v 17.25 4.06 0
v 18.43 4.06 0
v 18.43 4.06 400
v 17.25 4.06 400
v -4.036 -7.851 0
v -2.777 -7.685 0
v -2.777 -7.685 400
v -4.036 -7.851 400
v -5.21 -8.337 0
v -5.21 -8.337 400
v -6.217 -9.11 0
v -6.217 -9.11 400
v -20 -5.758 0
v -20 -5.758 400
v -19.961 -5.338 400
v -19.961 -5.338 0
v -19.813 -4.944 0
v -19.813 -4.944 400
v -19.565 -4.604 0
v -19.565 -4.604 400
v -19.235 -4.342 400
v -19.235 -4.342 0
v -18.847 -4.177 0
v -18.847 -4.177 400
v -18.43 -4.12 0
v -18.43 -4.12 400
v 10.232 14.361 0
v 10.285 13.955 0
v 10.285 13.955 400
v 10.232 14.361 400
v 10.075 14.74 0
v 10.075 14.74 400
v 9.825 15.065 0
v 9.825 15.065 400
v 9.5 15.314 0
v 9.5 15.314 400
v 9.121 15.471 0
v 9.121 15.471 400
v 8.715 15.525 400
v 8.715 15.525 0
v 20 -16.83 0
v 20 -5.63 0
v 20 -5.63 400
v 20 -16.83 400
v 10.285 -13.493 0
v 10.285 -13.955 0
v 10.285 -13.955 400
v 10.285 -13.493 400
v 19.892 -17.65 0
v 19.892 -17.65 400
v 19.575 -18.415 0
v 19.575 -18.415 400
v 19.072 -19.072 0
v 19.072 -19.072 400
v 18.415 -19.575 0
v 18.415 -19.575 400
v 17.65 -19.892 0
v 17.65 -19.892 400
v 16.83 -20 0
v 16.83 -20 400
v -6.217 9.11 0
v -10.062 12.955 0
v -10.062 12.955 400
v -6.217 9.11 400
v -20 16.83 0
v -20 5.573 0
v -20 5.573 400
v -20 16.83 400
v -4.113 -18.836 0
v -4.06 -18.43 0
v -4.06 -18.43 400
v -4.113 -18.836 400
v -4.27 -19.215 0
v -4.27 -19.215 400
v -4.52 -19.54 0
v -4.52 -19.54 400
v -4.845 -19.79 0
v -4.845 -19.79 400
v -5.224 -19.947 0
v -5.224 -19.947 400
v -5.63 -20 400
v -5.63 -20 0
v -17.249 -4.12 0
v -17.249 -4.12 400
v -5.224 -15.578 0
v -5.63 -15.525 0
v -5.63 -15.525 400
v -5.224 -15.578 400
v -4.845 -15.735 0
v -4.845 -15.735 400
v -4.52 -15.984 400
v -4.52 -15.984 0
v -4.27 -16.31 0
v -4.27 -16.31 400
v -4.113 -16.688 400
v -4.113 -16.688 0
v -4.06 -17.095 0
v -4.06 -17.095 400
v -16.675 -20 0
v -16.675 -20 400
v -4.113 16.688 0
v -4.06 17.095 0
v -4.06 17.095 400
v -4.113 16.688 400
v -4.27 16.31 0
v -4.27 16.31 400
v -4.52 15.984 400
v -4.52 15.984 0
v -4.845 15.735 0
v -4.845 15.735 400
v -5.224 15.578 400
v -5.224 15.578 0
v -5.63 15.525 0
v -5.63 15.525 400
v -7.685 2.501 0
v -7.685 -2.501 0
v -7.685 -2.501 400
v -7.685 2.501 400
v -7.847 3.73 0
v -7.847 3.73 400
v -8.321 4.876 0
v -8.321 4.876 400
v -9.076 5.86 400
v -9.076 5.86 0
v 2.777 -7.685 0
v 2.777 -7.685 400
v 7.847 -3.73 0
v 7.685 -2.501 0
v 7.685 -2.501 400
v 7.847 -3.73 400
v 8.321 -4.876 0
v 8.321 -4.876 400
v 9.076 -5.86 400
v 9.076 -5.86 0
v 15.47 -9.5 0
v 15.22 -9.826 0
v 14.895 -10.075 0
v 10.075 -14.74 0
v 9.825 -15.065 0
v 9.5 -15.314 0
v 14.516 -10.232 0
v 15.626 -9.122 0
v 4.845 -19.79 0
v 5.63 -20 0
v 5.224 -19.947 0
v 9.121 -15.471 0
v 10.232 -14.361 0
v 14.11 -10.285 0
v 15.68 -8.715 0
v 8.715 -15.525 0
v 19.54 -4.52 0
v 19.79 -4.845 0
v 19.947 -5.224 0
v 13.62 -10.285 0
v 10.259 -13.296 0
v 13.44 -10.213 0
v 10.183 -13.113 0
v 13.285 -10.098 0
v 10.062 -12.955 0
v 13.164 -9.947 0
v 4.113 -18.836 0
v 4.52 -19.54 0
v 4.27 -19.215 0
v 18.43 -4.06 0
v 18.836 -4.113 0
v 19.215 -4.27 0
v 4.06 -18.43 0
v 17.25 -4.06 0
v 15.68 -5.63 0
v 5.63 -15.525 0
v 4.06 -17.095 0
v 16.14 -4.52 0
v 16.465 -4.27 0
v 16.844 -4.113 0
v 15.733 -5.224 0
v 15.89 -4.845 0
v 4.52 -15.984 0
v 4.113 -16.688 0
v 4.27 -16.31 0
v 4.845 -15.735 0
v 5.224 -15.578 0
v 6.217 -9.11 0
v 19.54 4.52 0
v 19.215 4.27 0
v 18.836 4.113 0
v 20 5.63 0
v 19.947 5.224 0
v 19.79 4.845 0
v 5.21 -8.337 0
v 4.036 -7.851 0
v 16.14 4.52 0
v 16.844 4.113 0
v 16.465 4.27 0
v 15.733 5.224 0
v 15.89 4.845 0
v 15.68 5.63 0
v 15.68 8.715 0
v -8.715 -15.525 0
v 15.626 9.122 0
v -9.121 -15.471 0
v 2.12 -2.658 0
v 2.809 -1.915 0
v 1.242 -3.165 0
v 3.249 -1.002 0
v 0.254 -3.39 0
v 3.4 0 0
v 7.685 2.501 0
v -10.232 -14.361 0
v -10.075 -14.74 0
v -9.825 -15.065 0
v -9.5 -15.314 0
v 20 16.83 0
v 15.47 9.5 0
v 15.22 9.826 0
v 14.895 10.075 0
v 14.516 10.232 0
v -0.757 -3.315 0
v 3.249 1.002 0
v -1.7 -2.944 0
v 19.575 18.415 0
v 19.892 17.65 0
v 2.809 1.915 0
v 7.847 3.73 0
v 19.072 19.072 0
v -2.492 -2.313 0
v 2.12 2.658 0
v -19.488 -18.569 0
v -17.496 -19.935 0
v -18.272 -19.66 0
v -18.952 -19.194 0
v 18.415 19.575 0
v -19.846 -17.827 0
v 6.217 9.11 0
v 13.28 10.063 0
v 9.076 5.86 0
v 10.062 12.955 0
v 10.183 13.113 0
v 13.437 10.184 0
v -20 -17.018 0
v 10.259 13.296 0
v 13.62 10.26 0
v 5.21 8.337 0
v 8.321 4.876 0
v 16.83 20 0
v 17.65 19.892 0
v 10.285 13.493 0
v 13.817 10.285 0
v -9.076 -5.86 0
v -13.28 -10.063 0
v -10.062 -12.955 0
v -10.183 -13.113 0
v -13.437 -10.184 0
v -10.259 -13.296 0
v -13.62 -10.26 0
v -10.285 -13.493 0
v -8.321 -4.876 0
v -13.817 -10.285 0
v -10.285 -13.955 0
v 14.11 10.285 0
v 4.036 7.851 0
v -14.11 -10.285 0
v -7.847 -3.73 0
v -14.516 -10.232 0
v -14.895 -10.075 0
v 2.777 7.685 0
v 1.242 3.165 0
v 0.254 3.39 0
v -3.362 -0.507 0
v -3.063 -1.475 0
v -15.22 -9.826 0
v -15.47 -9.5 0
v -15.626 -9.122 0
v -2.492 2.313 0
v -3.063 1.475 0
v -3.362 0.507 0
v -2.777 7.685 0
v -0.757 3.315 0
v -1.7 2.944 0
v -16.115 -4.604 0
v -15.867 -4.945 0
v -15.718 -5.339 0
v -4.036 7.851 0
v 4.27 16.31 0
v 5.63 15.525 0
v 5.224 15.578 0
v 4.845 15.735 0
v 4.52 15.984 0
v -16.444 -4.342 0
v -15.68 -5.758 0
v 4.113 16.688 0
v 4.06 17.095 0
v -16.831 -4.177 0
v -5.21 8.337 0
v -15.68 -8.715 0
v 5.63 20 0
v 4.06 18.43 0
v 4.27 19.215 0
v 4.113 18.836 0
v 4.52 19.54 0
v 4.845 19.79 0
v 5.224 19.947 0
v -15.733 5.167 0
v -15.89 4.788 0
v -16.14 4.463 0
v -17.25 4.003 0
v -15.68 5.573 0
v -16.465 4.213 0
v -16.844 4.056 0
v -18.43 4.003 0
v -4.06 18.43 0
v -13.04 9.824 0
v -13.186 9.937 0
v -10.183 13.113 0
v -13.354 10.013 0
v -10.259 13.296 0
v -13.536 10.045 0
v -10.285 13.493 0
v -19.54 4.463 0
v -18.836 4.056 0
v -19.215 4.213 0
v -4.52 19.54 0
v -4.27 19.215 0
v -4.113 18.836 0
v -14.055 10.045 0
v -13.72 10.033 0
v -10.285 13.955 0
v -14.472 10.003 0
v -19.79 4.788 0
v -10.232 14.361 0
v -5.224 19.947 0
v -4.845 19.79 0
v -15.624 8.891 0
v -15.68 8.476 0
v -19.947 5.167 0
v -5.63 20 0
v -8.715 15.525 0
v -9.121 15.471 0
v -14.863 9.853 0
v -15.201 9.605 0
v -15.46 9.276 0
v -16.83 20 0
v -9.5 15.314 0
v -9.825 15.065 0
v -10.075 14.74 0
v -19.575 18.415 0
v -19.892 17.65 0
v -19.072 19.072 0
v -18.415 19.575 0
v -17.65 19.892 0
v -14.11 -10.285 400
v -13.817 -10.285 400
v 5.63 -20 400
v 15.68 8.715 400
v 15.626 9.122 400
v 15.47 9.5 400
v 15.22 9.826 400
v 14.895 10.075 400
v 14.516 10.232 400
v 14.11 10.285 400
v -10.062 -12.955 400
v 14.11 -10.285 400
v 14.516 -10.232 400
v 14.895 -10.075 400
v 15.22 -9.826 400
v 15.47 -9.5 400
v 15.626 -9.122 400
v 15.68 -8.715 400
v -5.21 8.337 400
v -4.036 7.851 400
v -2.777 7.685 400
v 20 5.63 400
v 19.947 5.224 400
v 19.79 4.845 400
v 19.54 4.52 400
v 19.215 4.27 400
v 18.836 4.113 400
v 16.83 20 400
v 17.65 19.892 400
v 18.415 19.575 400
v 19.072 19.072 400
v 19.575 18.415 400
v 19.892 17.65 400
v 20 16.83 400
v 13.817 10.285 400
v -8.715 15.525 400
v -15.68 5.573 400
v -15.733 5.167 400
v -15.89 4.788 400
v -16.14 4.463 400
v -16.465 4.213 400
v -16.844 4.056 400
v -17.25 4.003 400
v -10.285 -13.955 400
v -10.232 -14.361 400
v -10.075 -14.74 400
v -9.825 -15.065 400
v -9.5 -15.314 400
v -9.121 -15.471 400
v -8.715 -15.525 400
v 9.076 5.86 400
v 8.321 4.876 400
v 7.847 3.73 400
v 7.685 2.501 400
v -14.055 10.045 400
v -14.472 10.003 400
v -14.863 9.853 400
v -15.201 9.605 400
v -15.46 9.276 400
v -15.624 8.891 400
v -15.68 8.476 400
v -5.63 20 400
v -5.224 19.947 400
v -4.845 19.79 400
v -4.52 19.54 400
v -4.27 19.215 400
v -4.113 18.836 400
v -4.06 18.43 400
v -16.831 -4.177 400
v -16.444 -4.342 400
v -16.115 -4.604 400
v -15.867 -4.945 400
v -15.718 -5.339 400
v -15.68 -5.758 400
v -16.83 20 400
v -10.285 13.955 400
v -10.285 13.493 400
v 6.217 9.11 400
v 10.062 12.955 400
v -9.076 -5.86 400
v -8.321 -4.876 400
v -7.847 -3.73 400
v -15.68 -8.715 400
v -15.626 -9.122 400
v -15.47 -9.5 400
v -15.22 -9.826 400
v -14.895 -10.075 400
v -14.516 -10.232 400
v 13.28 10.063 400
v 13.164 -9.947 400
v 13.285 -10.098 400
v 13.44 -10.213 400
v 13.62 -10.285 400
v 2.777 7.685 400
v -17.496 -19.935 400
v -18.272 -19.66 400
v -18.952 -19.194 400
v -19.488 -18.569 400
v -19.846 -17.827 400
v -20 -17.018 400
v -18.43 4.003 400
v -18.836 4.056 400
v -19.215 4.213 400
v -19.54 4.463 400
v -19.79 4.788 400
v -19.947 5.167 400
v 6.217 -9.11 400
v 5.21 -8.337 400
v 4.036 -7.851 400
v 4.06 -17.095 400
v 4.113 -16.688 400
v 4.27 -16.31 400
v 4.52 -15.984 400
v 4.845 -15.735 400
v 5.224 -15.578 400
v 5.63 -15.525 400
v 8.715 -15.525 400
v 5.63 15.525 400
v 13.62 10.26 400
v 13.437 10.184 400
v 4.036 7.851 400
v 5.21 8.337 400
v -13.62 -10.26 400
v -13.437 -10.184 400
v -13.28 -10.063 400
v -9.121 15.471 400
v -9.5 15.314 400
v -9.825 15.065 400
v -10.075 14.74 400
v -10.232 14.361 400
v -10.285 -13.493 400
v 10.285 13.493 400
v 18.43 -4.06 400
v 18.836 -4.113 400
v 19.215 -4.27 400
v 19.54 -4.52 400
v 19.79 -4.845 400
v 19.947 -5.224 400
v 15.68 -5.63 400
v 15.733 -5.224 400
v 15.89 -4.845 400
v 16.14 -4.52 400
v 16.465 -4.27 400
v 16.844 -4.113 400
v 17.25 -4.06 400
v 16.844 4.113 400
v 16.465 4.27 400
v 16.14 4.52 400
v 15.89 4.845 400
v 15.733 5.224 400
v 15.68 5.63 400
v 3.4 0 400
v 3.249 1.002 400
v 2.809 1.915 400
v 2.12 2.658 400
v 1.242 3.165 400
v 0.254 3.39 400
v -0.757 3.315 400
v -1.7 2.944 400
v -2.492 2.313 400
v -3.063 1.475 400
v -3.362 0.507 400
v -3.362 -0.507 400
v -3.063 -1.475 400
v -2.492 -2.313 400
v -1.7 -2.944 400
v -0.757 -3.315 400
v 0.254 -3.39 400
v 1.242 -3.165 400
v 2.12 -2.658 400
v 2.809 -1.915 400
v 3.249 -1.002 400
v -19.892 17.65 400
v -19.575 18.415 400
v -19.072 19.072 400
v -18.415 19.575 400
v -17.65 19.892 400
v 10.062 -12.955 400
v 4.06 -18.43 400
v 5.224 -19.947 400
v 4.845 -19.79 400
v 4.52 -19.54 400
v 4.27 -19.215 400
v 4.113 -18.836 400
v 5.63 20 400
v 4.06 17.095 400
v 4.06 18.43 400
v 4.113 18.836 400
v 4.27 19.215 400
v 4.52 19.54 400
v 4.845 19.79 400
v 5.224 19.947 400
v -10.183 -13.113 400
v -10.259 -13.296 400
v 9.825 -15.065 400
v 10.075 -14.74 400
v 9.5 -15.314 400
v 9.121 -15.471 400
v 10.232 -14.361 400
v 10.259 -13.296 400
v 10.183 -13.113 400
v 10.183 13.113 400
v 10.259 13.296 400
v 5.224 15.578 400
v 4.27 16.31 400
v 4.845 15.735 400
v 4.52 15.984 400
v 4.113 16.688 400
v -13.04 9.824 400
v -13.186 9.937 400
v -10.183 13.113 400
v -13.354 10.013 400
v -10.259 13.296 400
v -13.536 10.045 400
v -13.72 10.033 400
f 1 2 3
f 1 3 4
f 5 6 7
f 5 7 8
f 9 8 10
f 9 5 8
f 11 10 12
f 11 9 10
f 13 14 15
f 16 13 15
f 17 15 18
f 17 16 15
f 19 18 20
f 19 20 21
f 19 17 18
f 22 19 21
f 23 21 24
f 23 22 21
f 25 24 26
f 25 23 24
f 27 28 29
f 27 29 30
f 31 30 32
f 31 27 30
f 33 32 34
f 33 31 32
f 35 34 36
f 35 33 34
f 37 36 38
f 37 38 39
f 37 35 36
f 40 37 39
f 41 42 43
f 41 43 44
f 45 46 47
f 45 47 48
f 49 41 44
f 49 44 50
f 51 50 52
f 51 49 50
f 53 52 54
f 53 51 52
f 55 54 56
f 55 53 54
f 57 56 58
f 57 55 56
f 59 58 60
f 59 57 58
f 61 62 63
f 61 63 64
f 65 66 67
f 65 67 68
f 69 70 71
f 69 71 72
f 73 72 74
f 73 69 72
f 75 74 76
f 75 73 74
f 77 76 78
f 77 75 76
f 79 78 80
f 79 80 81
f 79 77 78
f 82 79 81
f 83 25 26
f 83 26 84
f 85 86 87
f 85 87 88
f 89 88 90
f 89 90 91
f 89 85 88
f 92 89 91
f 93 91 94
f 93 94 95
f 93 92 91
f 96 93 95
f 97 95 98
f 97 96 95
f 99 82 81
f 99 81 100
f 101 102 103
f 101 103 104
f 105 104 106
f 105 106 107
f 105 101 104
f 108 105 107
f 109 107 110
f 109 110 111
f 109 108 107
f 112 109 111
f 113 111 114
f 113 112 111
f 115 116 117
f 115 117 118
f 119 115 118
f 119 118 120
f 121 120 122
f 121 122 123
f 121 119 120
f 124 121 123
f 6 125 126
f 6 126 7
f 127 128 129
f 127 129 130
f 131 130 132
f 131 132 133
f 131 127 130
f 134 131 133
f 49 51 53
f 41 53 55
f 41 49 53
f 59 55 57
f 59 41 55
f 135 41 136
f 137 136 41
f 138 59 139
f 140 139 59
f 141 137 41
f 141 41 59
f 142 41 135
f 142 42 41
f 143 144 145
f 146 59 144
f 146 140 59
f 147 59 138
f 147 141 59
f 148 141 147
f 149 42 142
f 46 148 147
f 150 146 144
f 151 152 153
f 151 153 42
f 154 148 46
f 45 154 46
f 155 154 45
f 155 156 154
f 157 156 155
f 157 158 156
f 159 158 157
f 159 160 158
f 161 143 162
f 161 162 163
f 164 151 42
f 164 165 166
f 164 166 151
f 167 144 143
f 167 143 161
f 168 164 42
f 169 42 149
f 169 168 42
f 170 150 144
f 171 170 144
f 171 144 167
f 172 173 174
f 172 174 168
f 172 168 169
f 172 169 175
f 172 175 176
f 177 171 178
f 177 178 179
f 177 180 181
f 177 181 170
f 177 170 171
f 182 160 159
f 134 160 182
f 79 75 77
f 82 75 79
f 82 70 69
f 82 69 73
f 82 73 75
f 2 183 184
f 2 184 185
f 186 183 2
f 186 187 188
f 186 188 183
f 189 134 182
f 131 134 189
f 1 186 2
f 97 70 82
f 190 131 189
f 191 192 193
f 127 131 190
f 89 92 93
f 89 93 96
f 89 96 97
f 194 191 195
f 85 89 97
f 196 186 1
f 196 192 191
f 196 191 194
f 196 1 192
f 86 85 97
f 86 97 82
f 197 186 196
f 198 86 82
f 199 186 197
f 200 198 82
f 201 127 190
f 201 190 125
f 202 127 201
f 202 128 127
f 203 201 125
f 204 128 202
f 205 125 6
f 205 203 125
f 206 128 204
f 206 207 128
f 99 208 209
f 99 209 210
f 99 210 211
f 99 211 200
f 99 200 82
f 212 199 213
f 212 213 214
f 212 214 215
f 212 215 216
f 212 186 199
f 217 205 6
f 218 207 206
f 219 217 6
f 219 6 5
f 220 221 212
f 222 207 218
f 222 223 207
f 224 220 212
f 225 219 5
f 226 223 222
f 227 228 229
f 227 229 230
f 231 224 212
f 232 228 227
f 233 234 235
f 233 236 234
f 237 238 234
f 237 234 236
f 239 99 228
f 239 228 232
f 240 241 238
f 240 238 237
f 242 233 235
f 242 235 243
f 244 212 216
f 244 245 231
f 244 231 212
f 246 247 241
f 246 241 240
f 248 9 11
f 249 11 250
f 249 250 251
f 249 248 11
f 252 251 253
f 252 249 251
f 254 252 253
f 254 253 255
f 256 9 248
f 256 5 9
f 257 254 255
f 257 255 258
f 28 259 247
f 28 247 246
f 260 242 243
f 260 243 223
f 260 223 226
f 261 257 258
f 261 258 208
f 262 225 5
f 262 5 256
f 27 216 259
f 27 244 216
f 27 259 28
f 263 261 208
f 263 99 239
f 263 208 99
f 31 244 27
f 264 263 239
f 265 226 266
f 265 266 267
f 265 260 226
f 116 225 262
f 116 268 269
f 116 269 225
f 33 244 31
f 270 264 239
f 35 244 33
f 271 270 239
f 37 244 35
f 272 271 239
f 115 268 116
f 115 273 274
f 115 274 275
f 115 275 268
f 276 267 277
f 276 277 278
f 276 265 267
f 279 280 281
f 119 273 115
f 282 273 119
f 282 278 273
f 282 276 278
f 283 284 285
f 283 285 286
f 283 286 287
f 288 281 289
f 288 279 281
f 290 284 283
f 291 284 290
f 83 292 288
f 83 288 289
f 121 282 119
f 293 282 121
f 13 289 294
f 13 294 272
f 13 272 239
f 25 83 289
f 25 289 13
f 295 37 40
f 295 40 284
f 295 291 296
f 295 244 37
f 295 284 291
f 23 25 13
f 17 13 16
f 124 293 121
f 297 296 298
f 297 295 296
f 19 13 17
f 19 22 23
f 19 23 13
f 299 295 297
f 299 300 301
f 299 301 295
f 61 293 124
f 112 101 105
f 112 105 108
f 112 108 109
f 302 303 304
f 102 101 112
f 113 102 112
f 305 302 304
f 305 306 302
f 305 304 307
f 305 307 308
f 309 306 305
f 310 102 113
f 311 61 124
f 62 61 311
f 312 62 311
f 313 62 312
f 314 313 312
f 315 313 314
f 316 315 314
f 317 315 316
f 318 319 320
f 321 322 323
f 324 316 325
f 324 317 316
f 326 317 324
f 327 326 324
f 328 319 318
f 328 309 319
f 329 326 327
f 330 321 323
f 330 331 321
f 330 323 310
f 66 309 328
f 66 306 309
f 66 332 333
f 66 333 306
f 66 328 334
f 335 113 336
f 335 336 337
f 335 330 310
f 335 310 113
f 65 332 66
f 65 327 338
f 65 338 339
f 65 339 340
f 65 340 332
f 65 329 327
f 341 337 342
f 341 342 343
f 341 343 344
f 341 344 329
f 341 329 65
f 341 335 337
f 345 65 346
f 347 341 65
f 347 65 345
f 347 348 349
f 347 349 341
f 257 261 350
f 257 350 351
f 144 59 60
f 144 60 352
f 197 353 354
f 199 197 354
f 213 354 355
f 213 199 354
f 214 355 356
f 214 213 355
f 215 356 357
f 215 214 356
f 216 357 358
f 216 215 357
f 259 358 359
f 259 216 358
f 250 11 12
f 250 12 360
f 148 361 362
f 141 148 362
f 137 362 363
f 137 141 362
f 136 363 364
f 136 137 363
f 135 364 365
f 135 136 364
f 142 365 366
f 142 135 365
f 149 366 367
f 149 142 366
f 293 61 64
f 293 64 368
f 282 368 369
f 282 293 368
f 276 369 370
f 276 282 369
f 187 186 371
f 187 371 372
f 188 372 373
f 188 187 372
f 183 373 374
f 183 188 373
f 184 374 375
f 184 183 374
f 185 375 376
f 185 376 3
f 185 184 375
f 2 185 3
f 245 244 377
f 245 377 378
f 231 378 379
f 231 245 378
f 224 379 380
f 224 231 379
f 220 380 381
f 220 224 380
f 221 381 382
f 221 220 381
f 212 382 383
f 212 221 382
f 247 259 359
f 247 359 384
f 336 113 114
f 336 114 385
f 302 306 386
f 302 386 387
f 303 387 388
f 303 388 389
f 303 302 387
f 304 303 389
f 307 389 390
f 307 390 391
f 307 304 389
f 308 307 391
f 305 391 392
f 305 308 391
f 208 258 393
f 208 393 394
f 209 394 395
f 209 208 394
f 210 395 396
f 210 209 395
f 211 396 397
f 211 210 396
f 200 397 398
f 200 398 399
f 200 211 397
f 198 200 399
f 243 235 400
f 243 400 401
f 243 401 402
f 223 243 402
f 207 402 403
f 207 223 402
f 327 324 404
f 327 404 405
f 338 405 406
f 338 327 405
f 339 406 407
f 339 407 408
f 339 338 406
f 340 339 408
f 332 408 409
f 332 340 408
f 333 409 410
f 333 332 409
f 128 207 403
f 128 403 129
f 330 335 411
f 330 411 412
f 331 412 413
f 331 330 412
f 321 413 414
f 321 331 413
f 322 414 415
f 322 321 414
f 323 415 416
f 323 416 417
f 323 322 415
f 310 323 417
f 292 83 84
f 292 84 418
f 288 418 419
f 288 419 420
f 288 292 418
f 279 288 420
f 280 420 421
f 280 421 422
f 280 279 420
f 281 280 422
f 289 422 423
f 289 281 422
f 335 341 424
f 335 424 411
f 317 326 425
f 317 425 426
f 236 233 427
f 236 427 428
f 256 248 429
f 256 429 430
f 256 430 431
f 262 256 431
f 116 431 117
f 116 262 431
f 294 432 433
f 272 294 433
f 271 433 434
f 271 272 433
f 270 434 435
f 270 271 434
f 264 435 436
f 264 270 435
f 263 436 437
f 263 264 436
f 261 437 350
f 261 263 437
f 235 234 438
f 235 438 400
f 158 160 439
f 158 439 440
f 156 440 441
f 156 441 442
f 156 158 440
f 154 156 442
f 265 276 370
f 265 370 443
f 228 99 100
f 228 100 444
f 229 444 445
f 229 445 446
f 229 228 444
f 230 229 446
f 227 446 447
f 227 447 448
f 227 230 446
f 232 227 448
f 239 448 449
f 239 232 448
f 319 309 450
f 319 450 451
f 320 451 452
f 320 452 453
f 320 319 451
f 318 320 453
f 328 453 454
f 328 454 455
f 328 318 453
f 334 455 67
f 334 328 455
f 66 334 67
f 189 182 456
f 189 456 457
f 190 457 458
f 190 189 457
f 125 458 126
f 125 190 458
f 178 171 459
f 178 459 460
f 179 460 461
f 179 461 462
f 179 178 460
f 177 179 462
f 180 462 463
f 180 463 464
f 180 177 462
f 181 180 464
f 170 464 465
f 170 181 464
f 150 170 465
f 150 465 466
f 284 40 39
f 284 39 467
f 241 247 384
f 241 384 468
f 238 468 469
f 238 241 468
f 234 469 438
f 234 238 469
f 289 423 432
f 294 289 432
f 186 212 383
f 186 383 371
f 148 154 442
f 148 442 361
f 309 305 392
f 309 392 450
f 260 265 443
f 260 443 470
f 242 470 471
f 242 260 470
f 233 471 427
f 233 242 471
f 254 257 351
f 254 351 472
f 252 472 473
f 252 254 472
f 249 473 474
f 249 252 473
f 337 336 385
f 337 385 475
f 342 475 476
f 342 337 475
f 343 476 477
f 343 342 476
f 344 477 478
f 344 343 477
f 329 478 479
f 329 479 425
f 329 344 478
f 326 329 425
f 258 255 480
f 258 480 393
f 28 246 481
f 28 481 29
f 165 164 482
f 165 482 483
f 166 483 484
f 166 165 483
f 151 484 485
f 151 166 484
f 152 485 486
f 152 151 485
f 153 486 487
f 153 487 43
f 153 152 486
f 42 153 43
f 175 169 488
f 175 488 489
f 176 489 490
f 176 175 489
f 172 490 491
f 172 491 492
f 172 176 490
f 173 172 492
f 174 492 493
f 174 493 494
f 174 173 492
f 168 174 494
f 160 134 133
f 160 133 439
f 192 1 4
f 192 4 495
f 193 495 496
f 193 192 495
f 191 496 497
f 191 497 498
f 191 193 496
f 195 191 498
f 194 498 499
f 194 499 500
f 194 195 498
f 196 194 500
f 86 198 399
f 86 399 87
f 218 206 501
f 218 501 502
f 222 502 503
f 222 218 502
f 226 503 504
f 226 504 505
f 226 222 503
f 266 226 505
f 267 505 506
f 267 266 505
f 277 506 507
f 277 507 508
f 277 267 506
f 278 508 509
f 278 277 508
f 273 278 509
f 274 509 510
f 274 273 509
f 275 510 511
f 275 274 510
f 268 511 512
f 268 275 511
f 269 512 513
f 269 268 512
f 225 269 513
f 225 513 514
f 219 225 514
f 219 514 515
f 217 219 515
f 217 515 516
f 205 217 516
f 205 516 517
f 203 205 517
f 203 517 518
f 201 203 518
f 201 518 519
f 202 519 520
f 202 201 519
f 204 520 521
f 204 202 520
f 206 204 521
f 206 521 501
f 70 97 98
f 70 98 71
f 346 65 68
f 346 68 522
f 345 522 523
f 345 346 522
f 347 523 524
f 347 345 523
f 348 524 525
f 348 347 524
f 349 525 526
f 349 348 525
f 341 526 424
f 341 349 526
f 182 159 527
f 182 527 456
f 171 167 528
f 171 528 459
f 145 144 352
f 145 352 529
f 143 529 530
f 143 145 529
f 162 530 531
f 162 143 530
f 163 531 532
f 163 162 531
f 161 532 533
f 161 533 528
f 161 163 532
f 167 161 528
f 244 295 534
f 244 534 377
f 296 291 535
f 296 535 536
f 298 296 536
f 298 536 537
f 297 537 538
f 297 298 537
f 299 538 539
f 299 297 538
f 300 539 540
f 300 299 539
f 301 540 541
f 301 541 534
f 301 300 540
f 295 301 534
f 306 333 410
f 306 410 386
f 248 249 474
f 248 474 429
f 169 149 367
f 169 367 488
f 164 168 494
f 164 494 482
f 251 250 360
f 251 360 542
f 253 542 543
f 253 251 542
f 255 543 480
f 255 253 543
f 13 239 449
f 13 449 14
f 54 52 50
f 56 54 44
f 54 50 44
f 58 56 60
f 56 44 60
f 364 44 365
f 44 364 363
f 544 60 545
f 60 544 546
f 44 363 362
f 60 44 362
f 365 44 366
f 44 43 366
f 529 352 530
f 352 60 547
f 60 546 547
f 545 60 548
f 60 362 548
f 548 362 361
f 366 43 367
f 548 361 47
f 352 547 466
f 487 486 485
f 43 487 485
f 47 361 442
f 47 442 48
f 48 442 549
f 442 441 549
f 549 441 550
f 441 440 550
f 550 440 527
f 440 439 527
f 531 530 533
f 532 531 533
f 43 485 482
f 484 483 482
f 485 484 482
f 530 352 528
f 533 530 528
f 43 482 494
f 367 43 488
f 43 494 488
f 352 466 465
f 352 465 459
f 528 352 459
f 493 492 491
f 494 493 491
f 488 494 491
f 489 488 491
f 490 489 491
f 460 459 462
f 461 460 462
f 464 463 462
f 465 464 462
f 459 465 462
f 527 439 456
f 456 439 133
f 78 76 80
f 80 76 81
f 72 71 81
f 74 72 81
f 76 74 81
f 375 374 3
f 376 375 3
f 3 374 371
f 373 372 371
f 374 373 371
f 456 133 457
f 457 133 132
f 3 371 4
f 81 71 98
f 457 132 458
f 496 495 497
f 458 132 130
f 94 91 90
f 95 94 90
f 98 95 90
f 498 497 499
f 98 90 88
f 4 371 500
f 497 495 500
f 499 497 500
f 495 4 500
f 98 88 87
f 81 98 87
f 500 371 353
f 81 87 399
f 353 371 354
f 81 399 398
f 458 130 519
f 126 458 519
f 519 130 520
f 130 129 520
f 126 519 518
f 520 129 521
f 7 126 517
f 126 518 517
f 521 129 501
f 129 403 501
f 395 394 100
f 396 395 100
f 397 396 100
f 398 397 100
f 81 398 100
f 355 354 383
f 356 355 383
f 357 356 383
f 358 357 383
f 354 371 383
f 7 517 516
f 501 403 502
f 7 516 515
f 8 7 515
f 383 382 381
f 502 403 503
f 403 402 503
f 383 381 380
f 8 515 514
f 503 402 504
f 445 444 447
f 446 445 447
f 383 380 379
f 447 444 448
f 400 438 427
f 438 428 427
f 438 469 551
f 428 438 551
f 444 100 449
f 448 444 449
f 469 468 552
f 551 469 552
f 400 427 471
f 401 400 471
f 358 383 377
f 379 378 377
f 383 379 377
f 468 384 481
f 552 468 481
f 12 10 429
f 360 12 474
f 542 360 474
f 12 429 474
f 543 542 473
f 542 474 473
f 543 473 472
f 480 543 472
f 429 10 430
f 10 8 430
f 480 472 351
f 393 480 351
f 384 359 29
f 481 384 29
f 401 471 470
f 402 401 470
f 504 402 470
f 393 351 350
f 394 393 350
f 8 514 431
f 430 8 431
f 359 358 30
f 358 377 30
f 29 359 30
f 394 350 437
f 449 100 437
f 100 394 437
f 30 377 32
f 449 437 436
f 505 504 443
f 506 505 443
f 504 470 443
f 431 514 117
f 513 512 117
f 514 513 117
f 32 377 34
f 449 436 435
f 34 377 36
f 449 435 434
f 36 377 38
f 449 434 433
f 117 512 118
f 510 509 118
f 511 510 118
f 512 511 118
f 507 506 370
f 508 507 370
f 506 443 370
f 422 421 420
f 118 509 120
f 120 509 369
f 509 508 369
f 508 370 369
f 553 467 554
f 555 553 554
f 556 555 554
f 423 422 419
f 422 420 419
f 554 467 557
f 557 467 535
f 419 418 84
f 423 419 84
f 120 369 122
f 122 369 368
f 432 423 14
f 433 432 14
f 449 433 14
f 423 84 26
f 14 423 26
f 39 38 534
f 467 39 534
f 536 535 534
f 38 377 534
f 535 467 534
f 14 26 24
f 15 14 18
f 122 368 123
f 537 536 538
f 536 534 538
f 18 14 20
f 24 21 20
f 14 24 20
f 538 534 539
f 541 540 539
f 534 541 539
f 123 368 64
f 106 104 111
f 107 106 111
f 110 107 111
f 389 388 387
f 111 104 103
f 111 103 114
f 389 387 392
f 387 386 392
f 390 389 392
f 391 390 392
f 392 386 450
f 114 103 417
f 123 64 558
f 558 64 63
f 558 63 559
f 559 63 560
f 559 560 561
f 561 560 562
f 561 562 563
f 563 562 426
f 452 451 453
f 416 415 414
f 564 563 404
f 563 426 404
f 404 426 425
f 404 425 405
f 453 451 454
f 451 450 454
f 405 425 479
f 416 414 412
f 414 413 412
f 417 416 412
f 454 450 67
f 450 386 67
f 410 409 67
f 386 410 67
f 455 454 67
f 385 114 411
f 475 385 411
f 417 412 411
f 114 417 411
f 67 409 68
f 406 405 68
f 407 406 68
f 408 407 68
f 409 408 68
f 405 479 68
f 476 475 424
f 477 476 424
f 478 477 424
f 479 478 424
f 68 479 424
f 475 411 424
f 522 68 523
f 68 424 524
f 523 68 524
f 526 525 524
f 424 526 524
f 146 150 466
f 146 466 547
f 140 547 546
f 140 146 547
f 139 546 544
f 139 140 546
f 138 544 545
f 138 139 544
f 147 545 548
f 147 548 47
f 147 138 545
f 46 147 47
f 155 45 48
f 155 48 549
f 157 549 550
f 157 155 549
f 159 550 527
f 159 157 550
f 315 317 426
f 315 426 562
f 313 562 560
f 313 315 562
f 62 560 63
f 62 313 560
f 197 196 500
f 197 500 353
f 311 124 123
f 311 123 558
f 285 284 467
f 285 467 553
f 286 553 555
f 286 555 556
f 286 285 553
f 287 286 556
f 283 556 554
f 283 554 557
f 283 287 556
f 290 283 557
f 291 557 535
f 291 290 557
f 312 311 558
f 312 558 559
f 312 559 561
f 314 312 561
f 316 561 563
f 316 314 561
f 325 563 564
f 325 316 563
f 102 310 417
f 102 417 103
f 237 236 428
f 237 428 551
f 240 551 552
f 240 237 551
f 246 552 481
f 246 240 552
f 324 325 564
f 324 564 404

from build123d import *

# Parameters (mm, degrees)
SKETCH1_R           = 3.4
BOSS_EXTRUDE1_DEPTH = 400


with BuildPart() as part:
    # Sketch1 → Boss-Extrude1 (new body)
    with BuildSketch(Plane.XY):
        with BuildLine():
            Line((-8.715, -15.524615034), (-5.63, -15.524615034))
            ThreePointArc((-5.63, -15.524615034), (-4.519842354, -15.984457388), (-4.06, -17.094615034))
            Line((-4.06, -17.094615034), (-4.06, -18.43))
            ThreePointArc((-4.06, -18.43), (-4.519842354, -19.540157646), (-5.63, -20))
            Line((-5.63, -20), (-16.674615034, -20))
            ThreePointArc((-16.674615034, -20), (-18.951578385, -19.194274381), (-20, -17.018368134))
            Line((-20, -17.018368134), (-20, -5.757918808))
            ThreePointArc((-20, -5.757918808), (-19.564709668, -4.603883664), (-18.43, -4.120449326))
            Line((-18.43, -4.120449326), (-17.248545805, -4.120449326))
            ThreePointArc((-17.248545805, -4.120449326), (-16.114784845, -4.604407881), (-15.67999625, -5.757919334))
            Line((-15.67999625, -5.757919334), (-15.67999625, -8.715399492))
            ThreePointArc((-15.67999625, -8.715399492), (-15.220153896, -9.825557139), (-14.10999625, -10.285399492))
            Line((-14.10999625, -10.285399492), (-13.816903094, -10.285399492))
            ThreePointArc((-13.816903094, -10.285399492), (-13.526063686, -10.227547937), (-13.279501941, -10.062800646))
            Line((-13.279501941, -10.062800646), (-9.076242789, -5.859541495))
            ThreePointArc((-9.076242789, -5.859541495), (-8.046572221, -4.318530588), (-7.685, -2.500784284))
            Line((-7.685, -2.500784284), (-7.685, 2.500784284))
            ThreePointArc((-7.685, 2.500784284), (-8.046572221, 4.318530588), (-9.076242789, 5.859541495))
            Line((-9.076242789, 5.859541495), (-13.040489136, 9.823787841))
            ThreePointArc((-13.040489136, 9.823787841), (-13.354224618, 10.012729352), (-13.71989919, 10.033001362))
            Line((-13.71989919, 10.033001362), (-14.05520779, 10.044710596))
            ThreePointArc((-14.05520779, 10.044710596), (-15.200613642, 9.605030484), (-15.68, 8.475666998))
            Line((-15.68, 8.475666998), (-15.68, 5.572979049))
            ThreePointArc((-15.68, 5.572979049), (-16.139842354, 4.462821403), (-17.25, 4.002979049))
            Line((-17.25, 4.002979049), (-18.43, 4.002979049))
            ThreePointArc((-18.43, 4.002979049), (-19.540157646, 4.462821403), (-20, 5.572979049))
            Line((-20, 5.572979049), (-20, 13.004526564))
            Line((-20, 13.004526564), (-20, 16.83))
            ThreePointArc((-20, 16.83), (-19.071528496, 19.071528496), (-16.83, 20))
            Line((-16.83, 20), (-5.63, 20))
            ThreePointArc((-5.63, 20), (-4.519842354, 19.540157646), (-4.06, 18.43))
            Line((-4.06, 18.43), (-4.06, 17.094615034))
            ThreePointArc((-4.06, 17.094615034), (-4.519842354, 15.984457388), (-5.63, 15.524615034))
            Line((-5.63, 15.524615034), (-8.715, 15.524615034))
            ThreePointArc((-8.715, 15.524615034), (-9.825157646, 15.06477268), (-10.285, 13.954615034))
            Line((-10.285, 13.954615034), (-10.285, 13.492503602))
            ThreePointArc((-10.285, 13.492503602), (-10.227148445, 13.201664194), (-10.062401154, 12.955102448))
            Line((-10.062401154, 12.955102448), (-6.217092793, 9.109794088))
            ThreePointArc((-6.217092793, 9.109794088), (-4.63891877, 8.055291919), (-2.777335583, 7.685))
            Line((-2.777335583, 7.685), (2.777335583, 7.685))
            ThreePointArc((2.777335583, 7.685), (4.63891877, 8.055291919), (6.217092793, 9.109794088))
            Line((6.217092793, 9.109794088), (10.062401154, 12.955102448))
            ThreePointArc((10.062401154, 12.955102448), (10.227148445, 13.201664194), (10.285, 13.492503602))
            Line((10.285, 13.492503602), (10.285, 13.954615034))
            ThreePointArc((10.285, 13.954615034), (9.825157646, 15.06477268), (8.715, 15.524615034))
            Line((8.715, 15.524615034), (5.63, 15.524615034))
            ThreePointArc((5.63, 15.524615034), (4.519842354, 15.984457388), (4.06, 17.094615034))
            Line((4.06, 17.094615034), (4.06, 18.43))
            ThreePointArc((4.06, 18.43), (4.519842354, 19.540157646), (5.63, 20))
            Line((5.63, 20), (12.979635074, 20))
            Line((12.979635074, 20), (16.83, 20))
            ThreePointArc((16.83, 20), (19.071528496, 19.071528496), (20, 16.83))
            Line((20, 16.83), (20, 13.001098436))
            Line((20, 13.001098436), (20, 5.630000526))
            ThreePointArc((20, 5.630000526), (19.540157646, 4.519842879), (18.43, 4.060000526))
            Line((18.43, 4.060000526), (17.24999625, 4.060000526))
            ThreePointArc((17.24999625, 4.060000526), (16.139838603, 4.519842879), (15.67999625, 5.630000526))
            Line((15.67999625, 5.630000526), (15.67999625, 8.715399492))
            ThreePointArc((15.67999625, 8.715399492), (15.220153896, 9.825557139), (14.10999625, 10.285399492))
            Line((14.10999625, 10.285399492), (13.816903094, 10.285399492))
            ThreePointArc((13.816903094, 10.285399492), (13.526063686, 10.227547937), (13.279501941, 10.062800646))
            Line((13.279501941, 10.062800646), (9.076242789, 5.859541495))
            ThreePointArc((9.076242789, 5.859541495), (8.046572221, 4.318530588), (7.685, 2.500784284))
            Line((7.685, 2.500784284), (7.685, -2.500784284))
            ThreePointArc((7.685, -2.500784284), (8.046572221, -4.318530588), (9.076242789, -5.859541495))
            Line((9.076242789, -5.859541495), (13.163657296, -9.946956002))
            ThreePointArc((13.163657296, -9.946956002), (13.35903797, -10.160433474), (13.6200547, -10.285399492))
            Line((13.6200547, -10.285399492), (14.10999625, -10.285399492))
            ThreePointArc((14.10999625, -10.285399492), (15.220153896, -9.825557139), (15.67999625, -8.715399492))
            Line((15.67999625, -8.715399492), (15.67999625, -5.630000526))
            ThreePointArc((15.67999625, -5.630000526), (16.139838603, -4.519842879), (17.24999625, -4.060000526))
            Line((17.24999625, -4.060000526), (18.43, -4.060000526))
            ThreePointArc((18.43, -4.060000526), (19.540157646, -4.519842879), (20, -5.630000526))
            Line((20, -5.630000526), (20, -16.83))
            ThreePointArc((20, -16.83), (19.071528496, -19.071528496), (16.83, -20))
            Line((16.83, -20), (13, -20))
            Line((13, -20), (5.63, -20))
            ThreePointArc((5.63, -20), (4.519842354, -19.540157646), (4.06, -18.43))
            Line((4.06, -18.43), (4.06, -17.094615034))
            ThreePointArc((4.06, -17.094615034), (4.519842354, -15.984457388), (5.63, -15.524615034))
            Line((5.63, -15.524615034), (8.715, -15.524615034))
            ThreePointArc((8.715, -15.524615034), (9.825157646, -15.06477268), (10.285, -13.954615034))
            Line((10.285, -13.954615034), (10.285, -13.492503602))
            ThreePointArc((10.285, -13.492503602), (10.227148445, -13.201664194), (10.062401154, -12.955102448))
            Line((10.062401154, -12.955102448), (6.217092793, -9.109794088))
            ThreePointArc((6.217092793, -9.109794088), (4.63891877, -8.055291919), (2.777335583, -7.685))
            Line((2.777335583, -7.685), (-2.777335583, -7.685))
            ThreePointArc((-2.777335583, -7.685), (-4.63891877, -8.055291919), (-6.217092793, -9.109794088))
            Line((-6.217092793, -9.109794088), (-10.062401154, -12.955102448))
            ThreePointArc((-10.062401154, -12.955102448), (-10.227148445, -13.201664194), (-10.285, -13.492503602))
            Line((-10.285, -13.492503602), (-10.285, -13.954615034))
            ThreePointArc((-10.285, -13.954615034), (-9.825157646, -15.06477268), (-8.715, -15.524615034))
        make_face()
        Circle(SKETCH1_R, mode=Mode.SUBTRACT)
    extrude(amount=BOSS_EXTRUDE1_DEPTH)


solid = part.part
